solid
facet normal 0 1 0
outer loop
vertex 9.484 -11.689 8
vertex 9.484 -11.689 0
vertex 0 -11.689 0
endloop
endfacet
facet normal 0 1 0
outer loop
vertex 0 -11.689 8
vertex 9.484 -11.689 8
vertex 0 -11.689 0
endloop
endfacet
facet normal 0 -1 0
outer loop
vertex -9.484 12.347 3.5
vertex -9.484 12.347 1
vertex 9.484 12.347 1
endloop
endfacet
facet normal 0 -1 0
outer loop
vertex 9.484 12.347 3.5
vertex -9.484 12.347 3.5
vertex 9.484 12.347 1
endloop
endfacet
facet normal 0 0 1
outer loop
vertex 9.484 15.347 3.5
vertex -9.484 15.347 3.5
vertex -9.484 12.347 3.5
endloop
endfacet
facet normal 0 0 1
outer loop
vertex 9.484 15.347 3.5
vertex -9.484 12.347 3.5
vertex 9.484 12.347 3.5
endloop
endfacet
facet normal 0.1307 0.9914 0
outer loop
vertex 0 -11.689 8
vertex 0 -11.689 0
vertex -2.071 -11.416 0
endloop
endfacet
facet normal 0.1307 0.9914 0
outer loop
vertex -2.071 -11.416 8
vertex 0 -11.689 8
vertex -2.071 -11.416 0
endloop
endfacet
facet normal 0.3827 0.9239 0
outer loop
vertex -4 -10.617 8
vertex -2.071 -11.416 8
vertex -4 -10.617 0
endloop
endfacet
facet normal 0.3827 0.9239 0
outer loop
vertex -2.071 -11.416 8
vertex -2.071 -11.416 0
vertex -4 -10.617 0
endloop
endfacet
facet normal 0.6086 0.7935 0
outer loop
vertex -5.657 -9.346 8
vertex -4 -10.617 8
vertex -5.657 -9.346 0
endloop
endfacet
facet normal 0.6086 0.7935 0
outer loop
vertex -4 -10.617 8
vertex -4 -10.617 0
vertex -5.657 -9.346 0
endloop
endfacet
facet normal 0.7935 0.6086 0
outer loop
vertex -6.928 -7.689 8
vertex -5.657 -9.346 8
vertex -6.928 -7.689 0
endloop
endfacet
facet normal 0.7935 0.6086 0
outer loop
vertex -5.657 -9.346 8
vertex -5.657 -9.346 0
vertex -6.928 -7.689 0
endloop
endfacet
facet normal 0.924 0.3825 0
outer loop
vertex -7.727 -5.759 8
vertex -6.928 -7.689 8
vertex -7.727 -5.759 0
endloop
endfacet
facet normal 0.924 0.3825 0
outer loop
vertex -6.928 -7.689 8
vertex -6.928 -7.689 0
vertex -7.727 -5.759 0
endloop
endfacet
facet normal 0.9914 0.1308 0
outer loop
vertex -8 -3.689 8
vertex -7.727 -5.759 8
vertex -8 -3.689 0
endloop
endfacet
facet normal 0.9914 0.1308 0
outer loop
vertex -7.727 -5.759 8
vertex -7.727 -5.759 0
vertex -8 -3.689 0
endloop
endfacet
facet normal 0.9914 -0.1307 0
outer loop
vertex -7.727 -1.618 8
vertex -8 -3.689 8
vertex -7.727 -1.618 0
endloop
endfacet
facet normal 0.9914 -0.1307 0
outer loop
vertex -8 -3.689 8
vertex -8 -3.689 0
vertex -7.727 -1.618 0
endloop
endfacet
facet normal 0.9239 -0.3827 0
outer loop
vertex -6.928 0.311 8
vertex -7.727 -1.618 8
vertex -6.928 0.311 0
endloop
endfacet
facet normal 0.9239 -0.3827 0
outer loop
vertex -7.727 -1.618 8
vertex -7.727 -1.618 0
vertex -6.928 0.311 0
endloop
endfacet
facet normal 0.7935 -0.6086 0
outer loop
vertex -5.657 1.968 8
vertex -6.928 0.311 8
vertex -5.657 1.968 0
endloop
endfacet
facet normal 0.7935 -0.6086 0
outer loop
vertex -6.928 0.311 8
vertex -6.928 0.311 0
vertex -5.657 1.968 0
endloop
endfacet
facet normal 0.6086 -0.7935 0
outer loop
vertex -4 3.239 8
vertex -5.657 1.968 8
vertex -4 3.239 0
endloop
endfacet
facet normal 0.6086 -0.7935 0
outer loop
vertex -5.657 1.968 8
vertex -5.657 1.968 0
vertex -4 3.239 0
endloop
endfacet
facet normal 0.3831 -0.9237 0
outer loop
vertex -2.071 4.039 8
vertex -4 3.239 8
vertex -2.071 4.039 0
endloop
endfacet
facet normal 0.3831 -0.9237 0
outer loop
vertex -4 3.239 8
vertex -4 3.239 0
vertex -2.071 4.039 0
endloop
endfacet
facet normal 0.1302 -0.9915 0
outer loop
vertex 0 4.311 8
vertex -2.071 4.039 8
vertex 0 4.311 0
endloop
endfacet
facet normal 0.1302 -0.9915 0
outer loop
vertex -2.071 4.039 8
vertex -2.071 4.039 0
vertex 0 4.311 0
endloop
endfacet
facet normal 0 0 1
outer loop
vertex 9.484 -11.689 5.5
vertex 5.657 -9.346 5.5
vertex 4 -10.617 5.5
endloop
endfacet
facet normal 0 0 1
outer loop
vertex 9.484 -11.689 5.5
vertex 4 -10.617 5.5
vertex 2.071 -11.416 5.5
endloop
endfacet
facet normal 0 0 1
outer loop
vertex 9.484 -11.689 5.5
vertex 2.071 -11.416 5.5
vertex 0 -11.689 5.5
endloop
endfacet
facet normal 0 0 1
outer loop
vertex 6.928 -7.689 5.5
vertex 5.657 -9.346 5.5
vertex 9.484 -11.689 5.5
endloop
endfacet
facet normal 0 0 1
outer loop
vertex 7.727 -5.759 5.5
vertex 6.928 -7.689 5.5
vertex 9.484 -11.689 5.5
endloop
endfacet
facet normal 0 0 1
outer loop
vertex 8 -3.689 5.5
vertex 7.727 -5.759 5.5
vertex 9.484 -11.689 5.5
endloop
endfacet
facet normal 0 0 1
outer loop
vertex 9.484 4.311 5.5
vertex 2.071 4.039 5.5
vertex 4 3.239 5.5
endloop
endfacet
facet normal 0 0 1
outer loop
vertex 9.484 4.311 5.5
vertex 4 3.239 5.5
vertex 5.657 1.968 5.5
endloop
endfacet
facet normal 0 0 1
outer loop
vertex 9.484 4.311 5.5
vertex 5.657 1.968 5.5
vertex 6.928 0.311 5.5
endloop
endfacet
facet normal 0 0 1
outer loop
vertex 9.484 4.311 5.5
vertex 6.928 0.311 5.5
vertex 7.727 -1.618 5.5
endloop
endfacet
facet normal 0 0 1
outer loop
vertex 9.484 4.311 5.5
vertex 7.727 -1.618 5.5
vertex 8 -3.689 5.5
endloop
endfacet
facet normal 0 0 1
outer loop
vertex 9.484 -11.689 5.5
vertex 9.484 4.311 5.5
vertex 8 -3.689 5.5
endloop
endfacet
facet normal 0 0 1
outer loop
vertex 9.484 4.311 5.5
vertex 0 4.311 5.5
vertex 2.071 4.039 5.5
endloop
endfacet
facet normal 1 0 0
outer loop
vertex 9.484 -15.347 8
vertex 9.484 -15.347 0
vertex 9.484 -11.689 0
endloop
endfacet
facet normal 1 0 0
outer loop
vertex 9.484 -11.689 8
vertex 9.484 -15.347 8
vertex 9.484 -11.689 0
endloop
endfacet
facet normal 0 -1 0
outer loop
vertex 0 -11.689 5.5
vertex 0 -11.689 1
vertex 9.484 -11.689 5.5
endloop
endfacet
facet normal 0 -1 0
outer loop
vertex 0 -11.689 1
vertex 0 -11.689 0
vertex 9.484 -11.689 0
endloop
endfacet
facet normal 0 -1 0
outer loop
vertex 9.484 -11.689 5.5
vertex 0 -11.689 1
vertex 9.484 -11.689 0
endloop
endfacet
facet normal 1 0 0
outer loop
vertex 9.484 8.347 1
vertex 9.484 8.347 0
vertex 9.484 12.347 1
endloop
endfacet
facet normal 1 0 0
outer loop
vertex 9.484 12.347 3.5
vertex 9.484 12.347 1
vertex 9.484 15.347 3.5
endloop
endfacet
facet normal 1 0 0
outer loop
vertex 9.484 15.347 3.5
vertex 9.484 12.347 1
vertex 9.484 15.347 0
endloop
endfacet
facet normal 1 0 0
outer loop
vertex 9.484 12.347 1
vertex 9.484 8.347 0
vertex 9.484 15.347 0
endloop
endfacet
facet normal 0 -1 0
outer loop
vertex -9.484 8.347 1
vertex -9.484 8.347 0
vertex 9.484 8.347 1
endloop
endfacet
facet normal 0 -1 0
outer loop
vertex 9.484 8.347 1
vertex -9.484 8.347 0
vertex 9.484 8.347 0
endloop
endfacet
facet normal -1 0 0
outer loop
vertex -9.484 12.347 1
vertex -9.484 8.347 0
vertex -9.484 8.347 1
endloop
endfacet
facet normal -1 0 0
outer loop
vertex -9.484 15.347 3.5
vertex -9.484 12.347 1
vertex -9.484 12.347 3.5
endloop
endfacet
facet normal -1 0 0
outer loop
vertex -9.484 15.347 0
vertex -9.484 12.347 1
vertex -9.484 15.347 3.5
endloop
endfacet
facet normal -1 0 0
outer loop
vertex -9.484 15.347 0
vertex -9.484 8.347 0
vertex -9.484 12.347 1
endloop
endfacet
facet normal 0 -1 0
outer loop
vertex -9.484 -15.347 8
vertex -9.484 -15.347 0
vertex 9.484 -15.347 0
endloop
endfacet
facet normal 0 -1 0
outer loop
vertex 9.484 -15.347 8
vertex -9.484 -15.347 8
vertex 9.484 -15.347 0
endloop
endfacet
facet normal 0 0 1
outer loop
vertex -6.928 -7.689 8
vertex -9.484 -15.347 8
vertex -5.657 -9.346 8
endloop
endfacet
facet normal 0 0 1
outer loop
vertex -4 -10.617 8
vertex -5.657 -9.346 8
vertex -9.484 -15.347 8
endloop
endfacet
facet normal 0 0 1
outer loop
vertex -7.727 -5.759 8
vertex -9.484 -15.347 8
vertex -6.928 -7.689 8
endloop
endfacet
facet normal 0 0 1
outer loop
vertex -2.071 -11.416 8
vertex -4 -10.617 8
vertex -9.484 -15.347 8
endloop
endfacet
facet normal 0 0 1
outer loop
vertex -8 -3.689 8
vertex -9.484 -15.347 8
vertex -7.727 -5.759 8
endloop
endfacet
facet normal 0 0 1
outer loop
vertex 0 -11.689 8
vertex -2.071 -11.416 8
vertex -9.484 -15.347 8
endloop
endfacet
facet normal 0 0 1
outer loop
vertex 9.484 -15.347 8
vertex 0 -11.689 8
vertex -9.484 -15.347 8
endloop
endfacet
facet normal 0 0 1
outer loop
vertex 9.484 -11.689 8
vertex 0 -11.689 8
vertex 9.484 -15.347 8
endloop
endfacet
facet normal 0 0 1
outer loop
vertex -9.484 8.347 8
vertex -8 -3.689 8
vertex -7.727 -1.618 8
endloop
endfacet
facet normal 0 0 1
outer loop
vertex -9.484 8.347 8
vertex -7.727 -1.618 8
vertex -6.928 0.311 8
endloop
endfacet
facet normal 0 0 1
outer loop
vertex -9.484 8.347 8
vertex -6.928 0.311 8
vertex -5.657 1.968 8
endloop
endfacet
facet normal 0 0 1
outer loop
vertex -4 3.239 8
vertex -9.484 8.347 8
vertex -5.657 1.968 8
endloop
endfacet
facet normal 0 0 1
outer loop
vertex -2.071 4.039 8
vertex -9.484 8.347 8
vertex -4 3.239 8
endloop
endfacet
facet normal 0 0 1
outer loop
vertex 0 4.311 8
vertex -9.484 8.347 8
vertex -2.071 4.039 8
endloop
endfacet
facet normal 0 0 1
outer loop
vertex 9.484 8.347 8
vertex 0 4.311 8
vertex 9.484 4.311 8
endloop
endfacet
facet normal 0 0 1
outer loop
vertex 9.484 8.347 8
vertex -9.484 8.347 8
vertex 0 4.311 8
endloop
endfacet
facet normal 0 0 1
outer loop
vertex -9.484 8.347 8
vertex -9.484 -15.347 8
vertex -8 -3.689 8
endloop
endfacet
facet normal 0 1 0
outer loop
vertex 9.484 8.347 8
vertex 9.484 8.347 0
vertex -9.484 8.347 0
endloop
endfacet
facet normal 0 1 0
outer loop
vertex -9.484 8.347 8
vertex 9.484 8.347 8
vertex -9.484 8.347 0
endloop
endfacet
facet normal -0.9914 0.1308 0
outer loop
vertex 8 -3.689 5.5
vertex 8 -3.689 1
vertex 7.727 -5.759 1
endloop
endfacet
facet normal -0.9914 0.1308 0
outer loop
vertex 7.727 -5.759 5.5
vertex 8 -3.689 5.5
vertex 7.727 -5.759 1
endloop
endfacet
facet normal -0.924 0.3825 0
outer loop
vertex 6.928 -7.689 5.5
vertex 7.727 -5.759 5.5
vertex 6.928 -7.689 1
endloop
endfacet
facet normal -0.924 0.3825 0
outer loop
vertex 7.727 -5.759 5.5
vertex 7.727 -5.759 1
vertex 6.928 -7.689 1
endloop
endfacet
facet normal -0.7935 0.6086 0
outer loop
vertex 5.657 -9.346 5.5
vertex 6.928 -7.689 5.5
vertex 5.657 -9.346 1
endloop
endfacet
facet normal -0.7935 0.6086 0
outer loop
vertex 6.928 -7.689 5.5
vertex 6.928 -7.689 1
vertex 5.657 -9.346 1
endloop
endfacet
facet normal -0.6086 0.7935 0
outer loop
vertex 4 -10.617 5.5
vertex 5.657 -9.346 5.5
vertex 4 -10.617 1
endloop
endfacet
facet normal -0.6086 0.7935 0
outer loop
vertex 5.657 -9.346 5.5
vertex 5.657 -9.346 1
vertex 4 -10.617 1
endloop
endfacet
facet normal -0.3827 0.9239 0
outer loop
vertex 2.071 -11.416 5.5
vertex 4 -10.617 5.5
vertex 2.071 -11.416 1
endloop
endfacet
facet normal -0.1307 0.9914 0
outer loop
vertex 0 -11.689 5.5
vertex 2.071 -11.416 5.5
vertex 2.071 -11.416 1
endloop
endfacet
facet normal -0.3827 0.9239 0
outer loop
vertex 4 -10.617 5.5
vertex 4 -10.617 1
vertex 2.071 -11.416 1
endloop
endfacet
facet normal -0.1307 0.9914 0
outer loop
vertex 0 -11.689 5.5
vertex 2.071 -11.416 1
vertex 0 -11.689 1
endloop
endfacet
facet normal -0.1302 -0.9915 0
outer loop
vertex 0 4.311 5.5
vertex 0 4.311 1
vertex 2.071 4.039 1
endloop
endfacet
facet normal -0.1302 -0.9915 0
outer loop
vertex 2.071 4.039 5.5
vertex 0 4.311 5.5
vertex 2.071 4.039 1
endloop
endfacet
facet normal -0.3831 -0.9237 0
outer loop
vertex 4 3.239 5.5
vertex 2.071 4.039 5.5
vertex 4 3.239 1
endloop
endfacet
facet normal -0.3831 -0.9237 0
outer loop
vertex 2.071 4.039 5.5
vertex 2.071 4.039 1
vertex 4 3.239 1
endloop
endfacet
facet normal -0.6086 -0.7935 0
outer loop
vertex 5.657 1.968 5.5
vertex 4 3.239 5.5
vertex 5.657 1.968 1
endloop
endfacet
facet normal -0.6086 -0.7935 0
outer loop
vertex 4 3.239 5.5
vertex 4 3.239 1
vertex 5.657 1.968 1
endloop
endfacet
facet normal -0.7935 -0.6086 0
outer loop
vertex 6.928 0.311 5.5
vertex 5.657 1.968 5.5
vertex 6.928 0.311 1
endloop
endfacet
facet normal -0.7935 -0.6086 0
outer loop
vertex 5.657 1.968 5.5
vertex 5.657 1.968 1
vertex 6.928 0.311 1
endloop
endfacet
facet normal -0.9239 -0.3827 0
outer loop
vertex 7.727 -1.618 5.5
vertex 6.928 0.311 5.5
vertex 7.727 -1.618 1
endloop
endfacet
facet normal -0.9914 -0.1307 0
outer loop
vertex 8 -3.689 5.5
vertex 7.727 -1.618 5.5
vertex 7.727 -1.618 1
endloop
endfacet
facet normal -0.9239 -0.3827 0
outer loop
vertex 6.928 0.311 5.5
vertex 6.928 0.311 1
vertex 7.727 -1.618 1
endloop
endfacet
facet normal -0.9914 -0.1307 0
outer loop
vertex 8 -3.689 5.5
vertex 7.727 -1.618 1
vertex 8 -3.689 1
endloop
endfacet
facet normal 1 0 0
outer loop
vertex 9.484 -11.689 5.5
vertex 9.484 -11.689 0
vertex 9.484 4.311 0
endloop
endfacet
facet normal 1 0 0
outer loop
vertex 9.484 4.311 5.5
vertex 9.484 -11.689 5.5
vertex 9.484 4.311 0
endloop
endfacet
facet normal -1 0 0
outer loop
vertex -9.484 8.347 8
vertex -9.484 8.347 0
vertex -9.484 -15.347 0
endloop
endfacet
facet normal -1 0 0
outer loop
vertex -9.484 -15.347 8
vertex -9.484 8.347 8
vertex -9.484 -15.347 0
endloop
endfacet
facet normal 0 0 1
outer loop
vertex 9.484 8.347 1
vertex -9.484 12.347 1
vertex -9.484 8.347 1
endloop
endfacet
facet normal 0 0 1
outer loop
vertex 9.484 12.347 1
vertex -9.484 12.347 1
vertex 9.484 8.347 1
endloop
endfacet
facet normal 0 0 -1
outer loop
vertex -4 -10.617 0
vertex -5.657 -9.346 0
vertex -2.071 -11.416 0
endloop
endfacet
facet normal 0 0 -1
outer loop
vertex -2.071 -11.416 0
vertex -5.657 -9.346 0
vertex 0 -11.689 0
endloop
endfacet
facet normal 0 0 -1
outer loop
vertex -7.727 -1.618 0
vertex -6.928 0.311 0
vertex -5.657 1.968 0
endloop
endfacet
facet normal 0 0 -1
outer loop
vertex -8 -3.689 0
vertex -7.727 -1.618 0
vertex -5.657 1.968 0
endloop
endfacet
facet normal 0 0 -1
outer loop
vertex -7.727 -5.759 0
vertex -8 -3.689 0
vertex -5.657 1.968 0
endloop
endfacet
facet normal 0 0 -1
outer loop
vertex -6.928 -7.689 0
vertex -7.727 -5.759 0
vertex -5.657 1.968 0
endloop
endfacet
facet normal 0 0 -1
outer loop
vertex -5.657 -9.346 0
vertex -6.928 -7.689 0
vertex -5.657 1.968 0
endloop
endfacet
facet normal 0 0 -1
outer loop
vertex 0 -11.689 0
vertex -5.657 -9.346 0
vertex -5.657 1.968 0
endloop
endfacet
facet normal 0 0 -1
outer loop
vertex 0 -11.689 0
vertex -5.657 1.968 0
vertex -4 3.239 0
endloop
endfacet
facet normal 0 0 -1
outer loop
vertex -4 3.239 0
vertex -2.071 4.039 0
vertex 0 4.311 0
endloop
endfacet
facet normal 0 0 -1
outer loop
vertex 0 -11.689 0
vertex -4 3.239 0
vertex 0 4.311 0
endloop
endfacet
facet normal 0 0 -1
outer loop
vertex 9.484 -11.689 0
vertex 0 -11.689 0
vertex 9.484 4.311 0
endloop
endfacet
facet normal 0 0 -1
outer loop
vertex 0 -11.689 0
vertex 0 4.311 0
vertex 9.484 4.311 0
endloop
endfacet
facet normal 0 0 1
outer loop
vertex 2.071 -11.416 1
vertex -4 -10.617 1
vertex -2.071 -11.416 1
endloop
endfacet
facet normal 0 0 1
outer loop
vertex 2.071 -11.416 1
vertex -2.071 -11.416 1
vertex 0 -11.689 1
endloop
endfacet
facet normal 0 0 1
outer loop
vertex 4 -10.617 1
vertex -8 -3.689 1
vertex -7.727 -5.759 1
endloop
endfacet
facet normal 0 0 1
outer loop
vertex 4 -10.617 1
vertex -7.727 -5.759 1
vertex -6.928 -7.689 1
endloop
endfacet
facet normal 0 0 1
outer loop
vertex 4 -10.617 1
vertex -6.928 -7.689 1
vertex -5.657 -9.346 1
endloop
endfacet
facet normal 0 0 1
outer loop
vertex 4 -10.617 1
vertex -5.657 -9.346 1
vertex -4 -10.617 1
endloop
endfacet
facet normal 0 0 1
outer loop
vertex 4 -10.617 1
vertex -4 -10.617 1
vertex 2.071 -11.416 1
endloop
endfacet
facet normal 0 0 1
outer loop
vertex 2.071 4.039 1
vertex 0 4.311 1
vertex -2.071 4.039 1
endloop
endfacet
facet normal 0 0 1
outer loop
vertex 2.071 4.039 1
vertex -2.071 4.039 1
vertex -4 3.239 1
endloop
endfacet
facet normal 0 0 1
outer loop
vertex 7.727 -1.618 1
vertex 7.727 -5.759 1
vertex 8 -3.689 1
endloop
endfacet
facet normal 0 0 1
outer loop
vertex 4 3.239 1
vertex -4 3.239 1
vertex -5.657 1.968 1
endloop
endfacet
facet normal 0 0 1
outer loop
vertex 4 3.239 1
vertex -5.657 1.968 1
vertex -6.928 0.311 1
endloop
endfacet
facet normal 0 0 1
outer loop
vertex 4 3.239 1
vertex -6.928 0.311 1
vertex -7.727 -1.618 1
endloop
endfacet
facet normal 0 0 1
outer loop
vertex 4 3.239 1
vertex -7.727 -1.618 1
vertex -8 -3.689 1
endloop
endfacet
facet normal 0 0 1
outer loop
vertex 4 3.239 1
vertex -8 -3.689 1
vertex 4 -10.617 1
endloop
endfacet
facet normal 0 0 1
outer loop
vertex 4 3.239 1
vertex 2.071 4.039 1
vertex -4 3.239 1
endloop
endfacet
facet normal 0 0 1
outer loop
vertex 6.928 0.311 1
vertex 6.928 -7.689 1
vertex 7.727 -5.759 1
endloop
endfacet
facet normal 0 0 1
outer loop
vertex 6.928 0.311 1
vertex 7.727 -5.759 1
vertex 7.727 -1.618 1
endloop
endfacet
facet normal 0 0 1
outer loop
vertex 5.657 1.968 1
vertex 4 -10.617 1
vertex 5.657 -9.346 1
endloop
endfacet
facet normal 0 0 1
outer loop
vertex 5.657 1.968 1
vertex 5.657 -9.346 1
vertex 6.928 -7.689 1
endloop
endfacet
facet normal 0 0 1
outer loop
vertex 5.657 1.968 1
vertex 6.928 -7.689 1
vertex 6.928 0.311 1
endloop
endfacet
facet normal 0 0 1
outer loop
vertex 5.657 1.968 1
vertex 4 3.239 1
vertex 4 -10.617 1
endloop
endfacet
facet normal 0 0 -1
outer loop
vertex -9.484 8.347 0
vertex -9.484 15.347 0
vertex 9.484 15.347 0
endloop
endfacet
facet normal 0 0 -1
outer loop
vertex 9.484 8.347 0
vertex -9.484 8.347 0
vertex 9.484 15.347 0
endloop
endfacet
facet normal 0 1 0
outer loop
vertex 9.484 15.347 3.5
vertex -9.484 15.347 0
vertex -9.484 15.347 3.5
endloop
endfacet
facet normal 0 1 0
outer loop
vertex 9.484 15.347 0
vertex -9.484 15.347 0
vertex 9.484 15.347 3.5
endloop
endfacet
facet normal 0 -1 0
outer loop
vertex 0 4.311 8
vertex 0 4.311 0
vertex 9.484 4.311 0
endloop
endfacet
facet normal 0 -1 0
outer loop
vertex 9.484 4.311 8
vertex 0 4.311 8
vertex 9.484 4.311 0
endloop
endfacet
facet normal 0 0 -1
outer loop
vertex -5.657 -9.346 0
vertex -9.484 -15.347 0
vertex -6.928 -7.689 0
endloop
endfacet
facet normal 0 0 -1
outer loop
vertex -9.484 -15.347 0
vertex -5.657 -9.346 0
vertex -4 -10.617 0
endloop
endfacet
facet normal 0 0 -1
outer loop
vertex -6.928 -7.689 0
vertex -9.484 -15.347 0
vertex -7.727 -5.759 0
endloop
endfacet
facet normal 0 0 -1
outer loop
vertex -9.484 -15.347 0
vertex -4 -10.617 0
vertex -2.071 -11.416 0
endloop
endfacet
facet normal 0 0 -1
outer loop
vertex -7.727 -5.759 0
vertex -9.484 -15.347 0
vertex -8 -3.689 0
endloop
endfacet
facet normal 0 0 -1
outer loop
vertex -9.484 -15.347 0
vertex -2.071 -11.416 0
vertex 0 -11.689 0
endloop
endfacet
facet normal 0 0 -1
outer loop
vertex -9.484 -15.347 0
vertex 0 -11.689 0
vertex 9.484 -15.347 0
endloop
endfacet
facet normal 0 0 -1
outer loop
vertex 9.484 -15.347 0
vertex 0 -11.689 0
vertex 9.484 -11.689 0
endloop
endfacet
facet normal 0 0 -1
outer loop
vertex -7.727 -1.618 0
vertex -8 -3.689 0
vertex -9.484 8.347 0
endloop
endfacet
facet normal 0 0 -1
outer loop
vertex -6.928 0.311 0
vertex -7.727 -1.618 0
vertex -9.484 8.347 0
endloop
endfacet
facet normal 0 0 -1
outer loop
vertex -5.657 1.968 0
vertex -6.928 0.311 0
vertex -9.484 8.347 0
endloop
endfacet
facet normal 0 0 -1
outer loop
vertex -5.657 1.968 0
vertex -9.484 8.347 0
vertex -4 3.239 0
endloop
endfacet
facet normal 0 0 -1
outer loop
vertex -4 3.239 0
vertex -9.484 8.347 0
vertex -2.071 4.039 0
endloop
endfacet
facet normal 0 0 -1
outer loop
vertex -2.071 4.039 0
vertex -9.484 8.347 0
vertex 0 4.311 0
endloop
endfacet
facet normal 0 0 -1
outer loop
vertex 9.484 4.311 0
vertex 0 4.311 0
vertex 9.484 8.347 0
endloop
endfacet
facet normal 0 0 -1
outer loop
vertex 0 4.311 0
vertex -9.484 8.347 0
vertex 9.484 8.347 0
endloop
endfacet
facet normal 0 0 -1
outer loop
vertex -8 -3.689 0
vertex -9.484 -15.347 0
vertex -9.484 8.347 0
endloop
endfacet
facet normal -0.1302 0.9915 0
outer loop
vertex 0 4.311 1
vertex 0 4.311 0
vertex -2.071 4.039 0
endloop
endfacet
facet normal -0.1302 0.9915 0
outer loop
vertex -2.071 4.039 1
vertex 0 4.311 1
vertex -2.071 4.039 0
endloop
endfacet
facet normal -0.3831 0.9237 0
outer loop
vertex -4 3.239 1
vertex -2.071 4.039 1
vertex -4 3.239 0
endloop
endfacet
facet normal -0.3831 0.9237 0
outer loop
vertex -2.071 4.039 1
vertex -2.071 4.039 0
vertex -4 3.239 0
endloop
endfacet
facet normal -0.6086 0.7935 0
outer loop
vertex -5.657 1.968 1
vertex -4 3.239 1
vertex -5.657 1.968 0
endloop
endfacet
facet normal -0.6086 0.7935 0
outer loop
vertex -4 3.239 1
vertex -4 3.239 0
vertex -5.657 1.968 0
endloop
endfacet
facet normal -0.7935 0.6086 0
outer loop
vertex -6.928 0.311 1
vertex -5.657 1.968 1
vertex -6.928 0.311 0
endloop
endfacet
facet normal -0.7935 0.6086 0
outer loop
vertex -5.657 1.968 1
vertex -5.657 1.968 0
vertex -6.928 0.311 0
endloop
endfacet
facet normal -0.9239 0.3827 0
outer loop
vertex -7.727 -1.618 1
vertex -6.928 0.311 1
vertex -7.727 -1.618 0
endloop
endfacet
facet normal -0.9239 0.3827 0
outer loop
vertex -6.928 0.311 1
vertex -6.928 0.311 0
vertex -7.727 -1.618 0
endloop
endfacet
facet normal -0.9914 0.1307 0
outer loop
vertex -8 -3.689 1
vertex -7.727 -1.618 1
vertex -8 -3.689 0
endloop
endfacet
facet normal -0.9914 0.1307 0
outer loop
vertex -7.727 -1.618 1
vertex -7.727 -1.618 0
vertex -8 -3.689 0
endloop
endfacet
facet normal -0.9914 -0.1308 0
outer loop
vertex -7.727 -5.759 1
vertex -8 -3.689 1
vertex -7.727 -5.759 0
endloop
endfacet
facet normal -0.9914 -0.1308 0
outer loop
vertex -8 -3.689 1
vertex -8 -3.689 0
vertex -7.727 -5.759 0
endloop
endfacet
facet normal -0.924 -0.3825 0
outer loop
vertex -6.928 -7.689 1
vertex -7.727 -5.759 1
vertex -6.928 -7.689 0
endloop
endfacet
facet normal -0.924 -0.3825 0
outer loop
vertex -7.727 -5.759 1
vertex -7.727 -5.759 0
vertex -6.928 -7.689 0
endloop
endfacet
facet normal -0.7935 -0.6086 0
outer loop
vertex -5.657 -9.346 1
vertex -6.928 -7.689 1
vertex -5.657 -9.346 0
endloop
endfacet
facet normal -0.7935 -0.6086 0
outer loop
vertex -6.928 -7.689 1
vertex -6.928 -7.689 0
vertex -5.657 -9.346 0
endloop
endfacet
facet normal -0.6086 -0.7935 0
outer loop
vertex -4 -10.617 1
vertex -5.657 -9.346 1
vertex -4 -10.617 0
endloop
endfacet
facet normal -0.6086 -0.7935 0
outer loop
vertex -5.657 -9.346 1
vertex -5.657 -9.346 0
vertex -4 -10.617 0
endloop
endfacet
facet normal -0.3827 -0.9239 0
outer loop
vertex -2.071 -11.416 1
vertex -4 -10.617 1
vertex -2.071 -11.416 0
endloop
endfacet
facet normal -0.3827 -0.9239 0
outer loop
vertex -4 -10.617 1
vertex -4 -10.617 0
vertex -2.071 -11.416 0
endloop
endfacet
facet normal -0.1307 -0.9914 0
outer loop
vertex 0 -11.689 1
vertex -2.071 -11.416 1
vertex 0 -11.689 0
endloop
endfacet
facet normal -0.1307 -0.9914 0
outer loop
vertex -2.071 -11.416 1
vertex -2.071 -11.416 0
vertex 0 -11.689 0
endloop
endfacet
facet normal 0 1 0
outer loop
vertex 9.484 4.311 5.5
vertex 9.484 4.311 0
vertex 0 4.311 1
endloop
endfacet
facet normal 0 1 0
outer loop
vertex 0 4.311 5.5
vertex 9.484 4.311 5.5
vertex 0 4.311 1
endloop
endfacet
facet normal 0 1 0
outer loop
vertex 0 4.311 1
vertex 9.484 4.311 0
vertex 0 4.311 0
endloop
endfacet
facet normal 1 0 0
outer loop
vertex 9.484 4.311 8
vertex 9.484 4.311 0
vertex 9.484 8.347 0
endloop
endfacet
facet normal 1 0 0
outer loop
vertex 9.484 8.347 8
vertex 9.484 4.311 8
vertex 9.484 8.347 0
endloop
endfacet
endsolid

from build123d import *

# Parameters (mm, degrees)
F0_W     = 18.968976
F0_H     = 4
F1_DEPTH = 1
F2_DEPTH = 5.5
F3_DEPTH = 8
F0_H_2   = 3
F4_DEPTH = 3.5


with BuildPart() as f1:
    # F0 (on Top) → F1 (new body)
    with BuildSketch(Plane.XY):
        with BuildLine():
            Line((0, -11.688868), (0, 4.311132))
            ThreePointArc((0, 4.311132), (-8, -3.688868), (0, -11.688868))
        make_face()
        with BuildLine():
            ThreePointArc((8, -3.688868), (5.656854, 1.967986), (0, 4.311132))
            Line((0, 4.311132), (0, -11.688868))
            ThreePointArc((0, -11.688868), (5.656854, -9.345722), (8, -3.688868))
        make_face()
        with Locations((0, 10.346789)):
            Rectangle(F0_W, F0_H)
    extrude(amount=F1_DEPTH)

    # F0 (on Top) → F2 (join)
    with BuildSketch(Plane.XY):
        with BuildLine():
            Line((9.484488, -11.688868), (9.484488, 4.311132))
            Line((9.484488, 4.311132), (0, 4.311132))
            ThreePointArc((0, 4.311132), (5.656854, 1.967986), (8, -3.688868))
            ThreePointArc((8, -3.688868), (5.656854, -9.345722), (0, -11.688868))
            Line((0, -11.688868), (9.484488, -11.688868))
        make_face()
    extrude(amount=F2_DEPTH)

    # F0 (on Top) → F4 (join)
    with BuildSketch(Plane.XY):
        with Locations((0, 13.846789)):
            Rectangle(F0_W, F0_H_2)
    extrude(amount=F4_DEPTH)


with BuildPart() as f3:
    # F0 (on Top) → F3 (new body)
    with BuildSketch(Plane.XY):
        with BuildLine():
            Line((9.484488, 4.311132), (9.484488, 8.346789))
            Line((9.484488, 8.346789), (-9.484488, 8.346789))
            Line((-9.484488, 8.346789), (-9.484488, -15.346789))
            Line((-9.484488, -15.346789), (9.484488, -15.346789))
            Line((9.484488, -15.346789), (9.484488, -11.688868))
            Line((9.484488, -11.688868), (0, -11.688868))
            ThreePointArc((0, -11.688868), (-8, -3.688868), (0, 4.311132))
            Line((0, 4.311132), (9.484488, 4.311132))
        make_face()
    extrude(amount=F3_DEPTH)


solid = Compound([f1.part, f3.part])
